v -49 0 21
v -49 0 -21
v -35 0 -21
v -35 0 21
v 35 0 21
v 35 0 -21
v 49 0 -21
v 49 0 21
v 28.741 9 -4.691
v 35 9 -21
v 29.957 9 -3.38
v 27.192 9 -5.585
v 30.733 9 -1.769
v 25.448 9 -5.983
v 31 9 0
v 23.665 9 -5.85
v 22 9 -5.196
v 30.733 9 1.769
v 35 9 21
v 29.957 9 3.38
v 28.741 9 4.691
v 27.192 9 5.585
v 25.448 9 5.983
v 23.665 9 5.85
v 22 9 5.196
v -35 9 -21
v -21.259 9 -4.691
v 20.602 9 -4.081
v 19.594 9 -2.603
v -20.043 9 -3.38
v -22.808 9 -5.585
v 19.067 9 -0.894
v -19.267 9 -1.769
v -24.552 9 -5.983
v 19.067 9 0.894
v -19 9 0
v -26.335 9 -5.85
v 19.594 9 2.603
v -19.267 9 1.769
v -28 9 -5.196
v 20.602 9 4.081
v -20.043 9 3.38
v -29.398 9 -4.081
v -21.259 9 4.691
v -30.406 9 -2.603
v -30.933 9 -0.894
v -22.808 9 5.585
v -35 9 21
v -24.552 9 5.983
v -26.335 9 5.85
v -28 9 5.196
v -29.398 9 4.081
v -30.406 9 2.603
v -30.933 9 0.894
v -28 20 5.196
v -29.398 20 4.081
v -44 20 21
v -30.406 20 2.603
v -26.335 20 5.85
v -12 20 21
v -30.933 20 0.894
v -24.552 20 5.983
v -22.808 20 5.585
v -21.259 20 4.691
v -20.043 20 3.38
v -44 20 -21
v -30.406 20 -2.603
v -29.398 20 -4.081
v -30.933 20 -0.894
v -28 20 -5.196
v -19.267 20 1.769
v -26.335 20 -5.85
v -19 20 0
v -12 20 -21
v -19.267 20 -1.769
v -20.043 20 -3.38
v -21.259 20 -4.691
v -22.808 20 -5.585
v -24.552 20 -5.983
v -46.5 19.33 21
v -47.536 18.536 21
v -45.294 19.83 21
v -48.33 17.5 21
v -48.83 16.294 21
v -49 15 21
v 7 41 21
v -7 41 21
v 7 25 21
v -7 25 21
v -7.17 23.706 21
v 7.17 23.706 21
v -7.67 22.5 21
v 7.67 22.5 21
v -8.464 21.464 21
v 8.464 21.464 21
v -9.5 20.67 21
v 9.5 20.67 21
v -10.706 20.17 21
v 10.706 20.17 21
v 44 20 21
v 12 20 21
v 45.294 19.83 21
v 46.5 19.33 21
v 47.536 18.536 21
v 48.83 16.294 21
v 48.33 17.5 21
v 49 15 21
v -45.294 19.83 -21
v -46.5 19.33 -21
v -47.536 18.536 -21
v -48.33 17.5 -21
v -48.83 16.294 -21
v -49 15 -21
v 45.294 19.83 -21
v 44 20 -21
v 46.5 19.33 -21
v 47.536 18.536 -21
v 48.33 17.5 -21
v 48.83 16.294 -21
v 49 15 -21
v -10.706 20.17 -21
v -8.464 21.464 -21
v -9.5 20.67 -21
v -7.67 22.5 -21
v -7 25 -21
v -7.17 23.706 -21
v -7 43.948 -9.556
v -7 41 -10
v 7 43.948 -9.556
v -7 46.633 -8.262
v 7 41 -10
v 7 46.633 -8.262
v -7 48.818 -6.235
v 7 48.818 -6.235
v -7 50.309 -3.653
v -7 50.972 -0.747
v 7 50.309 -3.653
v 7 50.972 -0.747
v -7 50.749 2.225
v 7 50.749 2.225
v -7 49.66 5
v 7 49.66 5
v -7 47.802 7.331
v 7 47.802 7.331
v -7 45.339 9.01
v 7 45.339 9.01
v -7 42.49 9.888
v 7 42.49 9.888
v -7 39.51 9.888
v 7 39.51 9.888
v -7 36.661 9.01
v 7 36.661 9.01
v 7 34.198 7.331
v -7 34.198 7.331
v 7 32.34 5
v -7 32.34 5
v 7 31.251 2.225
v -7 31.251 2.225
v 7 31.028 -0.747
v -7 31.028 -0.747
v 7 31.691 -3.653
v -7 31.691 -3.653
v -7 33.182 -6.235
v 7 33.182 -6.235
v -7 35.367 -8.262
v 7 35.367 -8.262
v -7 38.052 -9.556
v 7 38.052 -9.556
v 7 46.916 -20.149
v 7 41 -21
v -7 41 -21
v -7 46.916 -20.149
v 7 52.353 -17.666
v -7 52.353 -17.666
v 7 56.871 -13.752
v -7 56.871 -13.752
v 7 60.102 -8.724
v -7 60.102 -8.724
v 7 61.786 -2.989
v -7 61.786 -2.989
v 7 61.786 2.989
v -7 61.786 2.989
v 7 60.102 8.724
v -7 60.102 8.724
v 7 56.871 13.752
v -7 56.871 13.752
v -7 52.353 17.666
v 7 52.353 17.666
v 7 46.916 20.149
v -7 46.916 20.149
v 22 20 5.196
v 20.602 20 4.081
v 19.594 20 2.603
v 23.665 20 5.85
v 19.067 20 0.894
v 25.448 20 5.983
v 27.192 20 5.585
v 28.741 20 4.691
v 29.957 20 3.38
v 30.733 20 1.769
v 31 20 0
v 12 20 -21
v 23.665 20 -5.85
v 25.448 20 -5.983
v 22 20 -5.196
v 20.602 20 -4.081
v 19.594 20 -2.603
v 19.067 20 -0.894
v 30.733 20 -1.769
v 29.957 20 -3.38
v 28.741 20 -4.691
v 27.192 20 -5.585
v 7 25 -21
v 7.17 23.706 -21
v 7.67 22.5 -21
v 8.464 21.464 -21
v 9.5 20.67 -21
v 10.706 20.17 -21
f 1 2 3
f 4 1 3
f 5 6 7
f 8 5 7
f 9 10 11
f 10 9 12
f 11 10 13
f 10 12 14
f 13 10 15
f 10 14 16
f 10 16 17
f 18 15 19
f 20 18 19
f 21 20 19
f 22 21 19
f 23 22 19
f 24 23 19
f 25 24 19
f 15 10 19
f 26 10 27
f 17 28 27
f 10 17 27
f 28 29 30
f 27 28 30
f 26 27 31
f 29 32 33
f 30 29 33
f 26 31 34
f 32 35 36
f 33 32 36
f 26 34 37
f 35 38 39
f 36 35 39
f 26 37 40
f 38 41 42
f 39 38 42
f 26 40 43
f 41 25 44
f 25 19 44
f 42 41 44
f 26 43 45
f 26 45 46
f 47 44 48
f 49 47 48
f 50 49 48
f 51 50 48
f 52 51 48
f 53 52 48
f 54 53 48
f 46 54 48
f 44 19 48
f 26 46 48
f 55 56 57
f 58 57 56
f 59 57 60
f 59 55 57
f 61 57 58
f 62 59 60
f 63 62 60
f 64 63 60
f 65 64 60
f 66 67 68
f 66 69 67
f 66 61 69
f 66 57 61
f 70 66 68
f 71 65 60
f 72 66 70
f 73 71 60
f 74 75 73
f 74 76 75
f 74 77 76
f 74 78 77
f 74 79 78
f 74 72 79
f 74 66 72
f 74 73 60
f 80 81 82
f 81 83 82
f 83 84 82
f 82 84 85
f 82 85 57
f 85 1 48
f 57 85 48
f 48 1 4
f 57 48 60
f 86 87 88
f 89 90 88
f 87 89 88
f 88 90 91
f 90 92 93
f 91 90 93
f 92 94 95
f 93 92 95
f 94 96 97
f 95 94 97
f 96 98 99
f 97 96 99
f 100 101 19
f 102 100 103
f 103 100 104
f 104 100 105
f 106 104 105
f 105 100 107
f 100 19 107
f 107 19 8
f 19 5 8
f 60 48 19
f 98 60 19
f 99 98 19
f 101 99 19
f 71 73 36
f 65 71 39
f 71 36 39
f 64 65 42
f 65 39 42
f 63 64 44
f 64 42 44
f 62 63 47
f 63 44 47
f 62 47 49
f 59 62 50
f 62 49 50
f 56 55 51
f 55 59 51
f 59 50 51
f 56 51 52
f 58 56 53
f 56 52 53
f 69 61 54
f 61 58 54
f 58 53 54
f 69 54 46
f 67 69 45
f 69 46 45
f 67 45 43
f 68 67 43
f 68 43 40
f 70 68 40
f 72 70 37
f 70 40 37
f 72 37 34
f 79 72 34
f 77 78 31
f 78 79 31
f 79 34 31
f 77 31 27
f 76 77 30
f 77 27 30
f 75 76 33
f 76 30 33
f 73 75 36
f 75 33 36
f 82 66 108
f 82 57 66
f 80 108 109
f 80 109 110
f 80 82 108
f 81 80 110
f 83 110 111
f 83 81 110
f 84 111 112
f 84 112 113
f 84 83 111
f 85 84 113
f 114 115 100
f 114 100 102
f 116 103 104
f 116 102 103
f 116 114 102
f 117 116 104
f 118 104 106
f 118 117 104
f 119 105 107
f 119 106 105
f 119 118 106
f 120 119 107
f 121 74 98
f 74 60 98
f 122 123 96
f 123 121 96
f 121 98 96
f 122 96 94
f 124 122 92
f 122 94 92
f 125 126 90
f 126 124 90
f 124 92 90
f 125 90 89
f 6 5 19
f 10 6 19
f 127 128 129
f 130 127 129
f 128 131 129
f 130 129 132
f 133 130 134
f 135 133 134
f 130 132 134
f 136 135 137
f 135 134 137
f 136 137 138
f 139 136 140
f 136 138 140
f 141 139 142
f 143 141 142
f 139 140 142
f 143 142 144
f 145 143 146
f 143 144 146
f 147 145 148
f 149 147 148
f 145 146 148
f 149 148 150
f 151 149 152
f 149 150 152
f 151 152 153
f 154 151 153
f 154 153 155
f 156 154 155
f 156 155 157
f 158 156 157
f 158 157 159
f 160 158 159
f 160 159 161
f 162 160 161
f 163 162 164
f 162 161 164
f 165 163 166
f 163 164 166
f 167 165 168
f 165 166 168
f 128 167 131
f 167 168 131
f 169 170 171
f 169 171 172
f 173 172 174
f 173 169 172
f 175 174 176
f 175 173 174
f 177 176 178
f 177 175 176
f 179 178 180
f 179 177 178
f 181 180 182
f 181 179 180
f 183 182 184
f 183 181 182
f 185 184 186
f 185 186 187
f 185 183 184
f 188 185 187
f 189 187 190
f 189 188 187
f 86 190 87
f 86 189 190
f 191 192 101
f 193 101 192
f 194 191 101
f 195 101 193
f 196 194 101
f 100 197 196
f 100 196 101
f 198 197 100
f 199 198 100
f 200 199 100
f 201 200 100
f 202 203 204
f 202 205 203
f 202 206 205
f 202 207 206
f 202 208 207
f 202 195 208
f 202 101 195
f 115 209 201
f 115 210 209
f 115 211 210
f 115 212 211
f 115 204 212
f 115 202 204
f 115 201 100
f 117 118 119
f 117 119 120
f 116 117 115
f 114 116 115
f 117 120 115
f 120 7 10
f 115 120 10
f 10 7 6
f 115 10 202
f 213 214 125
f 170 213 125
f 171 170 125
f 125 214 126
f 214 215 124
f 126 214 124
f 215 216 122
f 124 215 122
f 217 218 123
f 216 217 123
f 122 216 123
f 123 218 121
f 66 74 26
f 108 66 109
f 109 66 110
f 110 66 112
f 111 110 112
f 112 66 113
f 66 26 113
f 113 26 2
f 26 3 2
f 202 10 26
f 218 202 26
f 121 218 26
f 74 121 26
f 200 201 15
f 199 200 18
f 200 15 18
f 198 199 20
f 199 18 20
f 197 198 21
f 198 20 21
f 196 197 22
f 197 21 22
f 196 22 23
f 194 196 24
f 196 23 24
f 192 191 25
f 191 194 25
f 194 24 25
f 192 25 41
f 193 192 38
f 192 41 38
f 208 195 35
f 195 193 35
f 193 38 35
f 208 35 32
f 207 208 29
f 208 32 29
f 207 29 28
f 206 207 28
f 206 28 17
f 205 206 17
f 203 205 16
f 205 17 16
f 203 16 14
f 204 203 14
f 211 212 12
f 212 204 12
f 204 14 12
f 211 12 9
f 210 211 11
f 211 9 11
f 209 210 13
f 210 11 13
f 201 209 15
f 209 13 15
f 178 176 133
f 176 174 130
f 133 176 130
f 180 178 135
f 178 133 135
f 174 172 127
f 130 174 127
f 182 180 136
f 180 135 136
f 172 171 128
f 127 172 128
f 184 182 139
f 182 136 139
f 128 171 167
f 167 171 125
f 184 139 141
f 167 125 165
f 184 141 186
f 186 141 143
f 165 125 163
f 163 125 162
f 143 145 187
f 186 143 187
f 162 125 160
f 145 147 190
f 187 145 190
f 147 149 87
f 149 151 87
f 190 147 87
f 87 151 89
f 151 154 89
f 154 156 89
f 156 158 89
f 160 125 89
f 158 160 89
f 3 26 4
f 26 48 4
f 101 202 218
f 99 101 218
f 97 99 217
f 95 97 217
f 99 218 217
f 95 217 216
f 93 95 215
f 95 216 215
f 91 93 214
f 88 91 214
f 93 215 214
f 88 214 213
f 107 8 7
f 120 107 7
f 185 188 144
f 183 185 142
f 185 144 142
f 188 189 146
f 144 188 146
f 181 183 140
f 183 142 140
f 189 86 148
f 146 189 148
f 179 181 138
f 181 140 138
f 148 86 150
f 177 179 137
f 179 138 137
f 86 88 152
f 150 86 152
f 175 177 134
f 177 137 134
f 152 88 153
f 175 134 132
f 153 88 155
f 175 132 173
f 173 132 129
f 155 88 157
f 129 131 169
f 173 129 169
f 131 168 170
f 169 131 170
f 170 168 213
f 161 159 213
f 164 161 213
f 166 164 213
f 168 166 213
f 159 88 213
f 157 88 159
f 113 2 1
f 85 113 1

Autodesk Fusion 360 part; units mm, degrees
sketch "Sketch1" plane through (0, 0, 0) normal (0, 1, 0) x (1, 0, 0)
  line L0 (49, 21) -> (-49, 21)
  line L1 (-49, 21) -> (-49, -21)
  line L2 (-49, -21) -> (49, -21)
  line L3 (49, -21) -> (49, 21)
  line L4 (49, 21) -> (-49, -21) construction
  line L5 (-49, 21) -> (49, -21) construction
  circle A0 centre (25, 0) radius 6
  circle A1 centre (-25, 0) radius 6
  dimension "d1" = 98
  dimension "d2" = 42
  dimension "d3" = 12
  dimension "d4" = 12
  dimension "d5" = 24
  dimension "d6" = 21
  dimension "d8" = 21
  dimension "d16" = 50
extrude "Extrude1" add sketch "Sketch1" along normal blind 20
sketch "Sketch2" plane through (0, 0, 21) normal (0, 0, 1) x (1, 0, 0)
  line L0 (-49, 0) -> (49, 0)
  line L1 (49, 0) -> (49, 20)
  line L2 (49, 20) -> (-49, 20)
  line L3 (-49, 20) -> (-49, 0)
  line L4 (-35, 0) -> (35, 0)
  line L5 (35, 0) -> (35, 9)
  line L6 (35, 9) -> (-35, 9)
  line L7 (-35, 9) -> (-35, 0)
  dimension "d11" = 70
  dimension "d12" = 9
  dimension "d13" = 14
extrude "Extrude2" cut sketch "Sketch2" against normal blind 42 contours L0 L4 L5 L6 L7
sketch "Sketch3" plane through (0, 20, 0) normal (0, 1, 0) x (-1, 0, 0)
  circle A0 centre (25, 0) radius 6
  circle A1 centre (-25, 0) radius 6
  line L0 (-49, 21) -> (-49, -21)
  line L1 (-49, -21) -> (49, -21)
  line L2 (49, -21) -> (49, 21)
  line L3 (49, 21) -> (-49, 21)
  line L4 (-7, -21) -> (7, -21)
  line L5 (7, -21) -> (7, 21)
  line L6 (7, 21) -> (-7, 21)
  line L7 (-7, 21) -> (-7, -21)
  line L8 (-7, -21) -> (7, 21) construction
  line L9 (7, -21) -> (-7, 21) construction
  dimension "d17" = 14
  dimension "d18" = 42
extrude "Extrude3" add sketch "Sketch3" along normal blind 42 contours L1 L3 L4 L5 L6 L7
sketch "Sketch4" plane through (7, 0, 0) normal (1, 0, 0) x (0, 0, -1)
  line L0 (-21, 20) -> (21, 20)
  line L1 (21, 20) -> (21, 62)
  line L2 (21, 62) -> (-21, 62)
  line L3 (-21, 62) -> (-21, 20)
  circle A0 centre (0, 41) radius 10
  arc A1 (21, 41) -> (-21, 41) centre (0, 41) ccw
  dimension "d21" = 42
  dimension "d22" = 21
extrude "Extrude4" cut sketch "Sketch4" against normal blind 14 contours L2 L3 A1 | L1 L2 A1 | A0
fillet "Fillet1" radius 5 2 edges at (49, 20, 0) (-49, 20, 0)
fillet "Fillet2" radius 5 2 edges at (7, 20, 0) (-7, 20, 0)
